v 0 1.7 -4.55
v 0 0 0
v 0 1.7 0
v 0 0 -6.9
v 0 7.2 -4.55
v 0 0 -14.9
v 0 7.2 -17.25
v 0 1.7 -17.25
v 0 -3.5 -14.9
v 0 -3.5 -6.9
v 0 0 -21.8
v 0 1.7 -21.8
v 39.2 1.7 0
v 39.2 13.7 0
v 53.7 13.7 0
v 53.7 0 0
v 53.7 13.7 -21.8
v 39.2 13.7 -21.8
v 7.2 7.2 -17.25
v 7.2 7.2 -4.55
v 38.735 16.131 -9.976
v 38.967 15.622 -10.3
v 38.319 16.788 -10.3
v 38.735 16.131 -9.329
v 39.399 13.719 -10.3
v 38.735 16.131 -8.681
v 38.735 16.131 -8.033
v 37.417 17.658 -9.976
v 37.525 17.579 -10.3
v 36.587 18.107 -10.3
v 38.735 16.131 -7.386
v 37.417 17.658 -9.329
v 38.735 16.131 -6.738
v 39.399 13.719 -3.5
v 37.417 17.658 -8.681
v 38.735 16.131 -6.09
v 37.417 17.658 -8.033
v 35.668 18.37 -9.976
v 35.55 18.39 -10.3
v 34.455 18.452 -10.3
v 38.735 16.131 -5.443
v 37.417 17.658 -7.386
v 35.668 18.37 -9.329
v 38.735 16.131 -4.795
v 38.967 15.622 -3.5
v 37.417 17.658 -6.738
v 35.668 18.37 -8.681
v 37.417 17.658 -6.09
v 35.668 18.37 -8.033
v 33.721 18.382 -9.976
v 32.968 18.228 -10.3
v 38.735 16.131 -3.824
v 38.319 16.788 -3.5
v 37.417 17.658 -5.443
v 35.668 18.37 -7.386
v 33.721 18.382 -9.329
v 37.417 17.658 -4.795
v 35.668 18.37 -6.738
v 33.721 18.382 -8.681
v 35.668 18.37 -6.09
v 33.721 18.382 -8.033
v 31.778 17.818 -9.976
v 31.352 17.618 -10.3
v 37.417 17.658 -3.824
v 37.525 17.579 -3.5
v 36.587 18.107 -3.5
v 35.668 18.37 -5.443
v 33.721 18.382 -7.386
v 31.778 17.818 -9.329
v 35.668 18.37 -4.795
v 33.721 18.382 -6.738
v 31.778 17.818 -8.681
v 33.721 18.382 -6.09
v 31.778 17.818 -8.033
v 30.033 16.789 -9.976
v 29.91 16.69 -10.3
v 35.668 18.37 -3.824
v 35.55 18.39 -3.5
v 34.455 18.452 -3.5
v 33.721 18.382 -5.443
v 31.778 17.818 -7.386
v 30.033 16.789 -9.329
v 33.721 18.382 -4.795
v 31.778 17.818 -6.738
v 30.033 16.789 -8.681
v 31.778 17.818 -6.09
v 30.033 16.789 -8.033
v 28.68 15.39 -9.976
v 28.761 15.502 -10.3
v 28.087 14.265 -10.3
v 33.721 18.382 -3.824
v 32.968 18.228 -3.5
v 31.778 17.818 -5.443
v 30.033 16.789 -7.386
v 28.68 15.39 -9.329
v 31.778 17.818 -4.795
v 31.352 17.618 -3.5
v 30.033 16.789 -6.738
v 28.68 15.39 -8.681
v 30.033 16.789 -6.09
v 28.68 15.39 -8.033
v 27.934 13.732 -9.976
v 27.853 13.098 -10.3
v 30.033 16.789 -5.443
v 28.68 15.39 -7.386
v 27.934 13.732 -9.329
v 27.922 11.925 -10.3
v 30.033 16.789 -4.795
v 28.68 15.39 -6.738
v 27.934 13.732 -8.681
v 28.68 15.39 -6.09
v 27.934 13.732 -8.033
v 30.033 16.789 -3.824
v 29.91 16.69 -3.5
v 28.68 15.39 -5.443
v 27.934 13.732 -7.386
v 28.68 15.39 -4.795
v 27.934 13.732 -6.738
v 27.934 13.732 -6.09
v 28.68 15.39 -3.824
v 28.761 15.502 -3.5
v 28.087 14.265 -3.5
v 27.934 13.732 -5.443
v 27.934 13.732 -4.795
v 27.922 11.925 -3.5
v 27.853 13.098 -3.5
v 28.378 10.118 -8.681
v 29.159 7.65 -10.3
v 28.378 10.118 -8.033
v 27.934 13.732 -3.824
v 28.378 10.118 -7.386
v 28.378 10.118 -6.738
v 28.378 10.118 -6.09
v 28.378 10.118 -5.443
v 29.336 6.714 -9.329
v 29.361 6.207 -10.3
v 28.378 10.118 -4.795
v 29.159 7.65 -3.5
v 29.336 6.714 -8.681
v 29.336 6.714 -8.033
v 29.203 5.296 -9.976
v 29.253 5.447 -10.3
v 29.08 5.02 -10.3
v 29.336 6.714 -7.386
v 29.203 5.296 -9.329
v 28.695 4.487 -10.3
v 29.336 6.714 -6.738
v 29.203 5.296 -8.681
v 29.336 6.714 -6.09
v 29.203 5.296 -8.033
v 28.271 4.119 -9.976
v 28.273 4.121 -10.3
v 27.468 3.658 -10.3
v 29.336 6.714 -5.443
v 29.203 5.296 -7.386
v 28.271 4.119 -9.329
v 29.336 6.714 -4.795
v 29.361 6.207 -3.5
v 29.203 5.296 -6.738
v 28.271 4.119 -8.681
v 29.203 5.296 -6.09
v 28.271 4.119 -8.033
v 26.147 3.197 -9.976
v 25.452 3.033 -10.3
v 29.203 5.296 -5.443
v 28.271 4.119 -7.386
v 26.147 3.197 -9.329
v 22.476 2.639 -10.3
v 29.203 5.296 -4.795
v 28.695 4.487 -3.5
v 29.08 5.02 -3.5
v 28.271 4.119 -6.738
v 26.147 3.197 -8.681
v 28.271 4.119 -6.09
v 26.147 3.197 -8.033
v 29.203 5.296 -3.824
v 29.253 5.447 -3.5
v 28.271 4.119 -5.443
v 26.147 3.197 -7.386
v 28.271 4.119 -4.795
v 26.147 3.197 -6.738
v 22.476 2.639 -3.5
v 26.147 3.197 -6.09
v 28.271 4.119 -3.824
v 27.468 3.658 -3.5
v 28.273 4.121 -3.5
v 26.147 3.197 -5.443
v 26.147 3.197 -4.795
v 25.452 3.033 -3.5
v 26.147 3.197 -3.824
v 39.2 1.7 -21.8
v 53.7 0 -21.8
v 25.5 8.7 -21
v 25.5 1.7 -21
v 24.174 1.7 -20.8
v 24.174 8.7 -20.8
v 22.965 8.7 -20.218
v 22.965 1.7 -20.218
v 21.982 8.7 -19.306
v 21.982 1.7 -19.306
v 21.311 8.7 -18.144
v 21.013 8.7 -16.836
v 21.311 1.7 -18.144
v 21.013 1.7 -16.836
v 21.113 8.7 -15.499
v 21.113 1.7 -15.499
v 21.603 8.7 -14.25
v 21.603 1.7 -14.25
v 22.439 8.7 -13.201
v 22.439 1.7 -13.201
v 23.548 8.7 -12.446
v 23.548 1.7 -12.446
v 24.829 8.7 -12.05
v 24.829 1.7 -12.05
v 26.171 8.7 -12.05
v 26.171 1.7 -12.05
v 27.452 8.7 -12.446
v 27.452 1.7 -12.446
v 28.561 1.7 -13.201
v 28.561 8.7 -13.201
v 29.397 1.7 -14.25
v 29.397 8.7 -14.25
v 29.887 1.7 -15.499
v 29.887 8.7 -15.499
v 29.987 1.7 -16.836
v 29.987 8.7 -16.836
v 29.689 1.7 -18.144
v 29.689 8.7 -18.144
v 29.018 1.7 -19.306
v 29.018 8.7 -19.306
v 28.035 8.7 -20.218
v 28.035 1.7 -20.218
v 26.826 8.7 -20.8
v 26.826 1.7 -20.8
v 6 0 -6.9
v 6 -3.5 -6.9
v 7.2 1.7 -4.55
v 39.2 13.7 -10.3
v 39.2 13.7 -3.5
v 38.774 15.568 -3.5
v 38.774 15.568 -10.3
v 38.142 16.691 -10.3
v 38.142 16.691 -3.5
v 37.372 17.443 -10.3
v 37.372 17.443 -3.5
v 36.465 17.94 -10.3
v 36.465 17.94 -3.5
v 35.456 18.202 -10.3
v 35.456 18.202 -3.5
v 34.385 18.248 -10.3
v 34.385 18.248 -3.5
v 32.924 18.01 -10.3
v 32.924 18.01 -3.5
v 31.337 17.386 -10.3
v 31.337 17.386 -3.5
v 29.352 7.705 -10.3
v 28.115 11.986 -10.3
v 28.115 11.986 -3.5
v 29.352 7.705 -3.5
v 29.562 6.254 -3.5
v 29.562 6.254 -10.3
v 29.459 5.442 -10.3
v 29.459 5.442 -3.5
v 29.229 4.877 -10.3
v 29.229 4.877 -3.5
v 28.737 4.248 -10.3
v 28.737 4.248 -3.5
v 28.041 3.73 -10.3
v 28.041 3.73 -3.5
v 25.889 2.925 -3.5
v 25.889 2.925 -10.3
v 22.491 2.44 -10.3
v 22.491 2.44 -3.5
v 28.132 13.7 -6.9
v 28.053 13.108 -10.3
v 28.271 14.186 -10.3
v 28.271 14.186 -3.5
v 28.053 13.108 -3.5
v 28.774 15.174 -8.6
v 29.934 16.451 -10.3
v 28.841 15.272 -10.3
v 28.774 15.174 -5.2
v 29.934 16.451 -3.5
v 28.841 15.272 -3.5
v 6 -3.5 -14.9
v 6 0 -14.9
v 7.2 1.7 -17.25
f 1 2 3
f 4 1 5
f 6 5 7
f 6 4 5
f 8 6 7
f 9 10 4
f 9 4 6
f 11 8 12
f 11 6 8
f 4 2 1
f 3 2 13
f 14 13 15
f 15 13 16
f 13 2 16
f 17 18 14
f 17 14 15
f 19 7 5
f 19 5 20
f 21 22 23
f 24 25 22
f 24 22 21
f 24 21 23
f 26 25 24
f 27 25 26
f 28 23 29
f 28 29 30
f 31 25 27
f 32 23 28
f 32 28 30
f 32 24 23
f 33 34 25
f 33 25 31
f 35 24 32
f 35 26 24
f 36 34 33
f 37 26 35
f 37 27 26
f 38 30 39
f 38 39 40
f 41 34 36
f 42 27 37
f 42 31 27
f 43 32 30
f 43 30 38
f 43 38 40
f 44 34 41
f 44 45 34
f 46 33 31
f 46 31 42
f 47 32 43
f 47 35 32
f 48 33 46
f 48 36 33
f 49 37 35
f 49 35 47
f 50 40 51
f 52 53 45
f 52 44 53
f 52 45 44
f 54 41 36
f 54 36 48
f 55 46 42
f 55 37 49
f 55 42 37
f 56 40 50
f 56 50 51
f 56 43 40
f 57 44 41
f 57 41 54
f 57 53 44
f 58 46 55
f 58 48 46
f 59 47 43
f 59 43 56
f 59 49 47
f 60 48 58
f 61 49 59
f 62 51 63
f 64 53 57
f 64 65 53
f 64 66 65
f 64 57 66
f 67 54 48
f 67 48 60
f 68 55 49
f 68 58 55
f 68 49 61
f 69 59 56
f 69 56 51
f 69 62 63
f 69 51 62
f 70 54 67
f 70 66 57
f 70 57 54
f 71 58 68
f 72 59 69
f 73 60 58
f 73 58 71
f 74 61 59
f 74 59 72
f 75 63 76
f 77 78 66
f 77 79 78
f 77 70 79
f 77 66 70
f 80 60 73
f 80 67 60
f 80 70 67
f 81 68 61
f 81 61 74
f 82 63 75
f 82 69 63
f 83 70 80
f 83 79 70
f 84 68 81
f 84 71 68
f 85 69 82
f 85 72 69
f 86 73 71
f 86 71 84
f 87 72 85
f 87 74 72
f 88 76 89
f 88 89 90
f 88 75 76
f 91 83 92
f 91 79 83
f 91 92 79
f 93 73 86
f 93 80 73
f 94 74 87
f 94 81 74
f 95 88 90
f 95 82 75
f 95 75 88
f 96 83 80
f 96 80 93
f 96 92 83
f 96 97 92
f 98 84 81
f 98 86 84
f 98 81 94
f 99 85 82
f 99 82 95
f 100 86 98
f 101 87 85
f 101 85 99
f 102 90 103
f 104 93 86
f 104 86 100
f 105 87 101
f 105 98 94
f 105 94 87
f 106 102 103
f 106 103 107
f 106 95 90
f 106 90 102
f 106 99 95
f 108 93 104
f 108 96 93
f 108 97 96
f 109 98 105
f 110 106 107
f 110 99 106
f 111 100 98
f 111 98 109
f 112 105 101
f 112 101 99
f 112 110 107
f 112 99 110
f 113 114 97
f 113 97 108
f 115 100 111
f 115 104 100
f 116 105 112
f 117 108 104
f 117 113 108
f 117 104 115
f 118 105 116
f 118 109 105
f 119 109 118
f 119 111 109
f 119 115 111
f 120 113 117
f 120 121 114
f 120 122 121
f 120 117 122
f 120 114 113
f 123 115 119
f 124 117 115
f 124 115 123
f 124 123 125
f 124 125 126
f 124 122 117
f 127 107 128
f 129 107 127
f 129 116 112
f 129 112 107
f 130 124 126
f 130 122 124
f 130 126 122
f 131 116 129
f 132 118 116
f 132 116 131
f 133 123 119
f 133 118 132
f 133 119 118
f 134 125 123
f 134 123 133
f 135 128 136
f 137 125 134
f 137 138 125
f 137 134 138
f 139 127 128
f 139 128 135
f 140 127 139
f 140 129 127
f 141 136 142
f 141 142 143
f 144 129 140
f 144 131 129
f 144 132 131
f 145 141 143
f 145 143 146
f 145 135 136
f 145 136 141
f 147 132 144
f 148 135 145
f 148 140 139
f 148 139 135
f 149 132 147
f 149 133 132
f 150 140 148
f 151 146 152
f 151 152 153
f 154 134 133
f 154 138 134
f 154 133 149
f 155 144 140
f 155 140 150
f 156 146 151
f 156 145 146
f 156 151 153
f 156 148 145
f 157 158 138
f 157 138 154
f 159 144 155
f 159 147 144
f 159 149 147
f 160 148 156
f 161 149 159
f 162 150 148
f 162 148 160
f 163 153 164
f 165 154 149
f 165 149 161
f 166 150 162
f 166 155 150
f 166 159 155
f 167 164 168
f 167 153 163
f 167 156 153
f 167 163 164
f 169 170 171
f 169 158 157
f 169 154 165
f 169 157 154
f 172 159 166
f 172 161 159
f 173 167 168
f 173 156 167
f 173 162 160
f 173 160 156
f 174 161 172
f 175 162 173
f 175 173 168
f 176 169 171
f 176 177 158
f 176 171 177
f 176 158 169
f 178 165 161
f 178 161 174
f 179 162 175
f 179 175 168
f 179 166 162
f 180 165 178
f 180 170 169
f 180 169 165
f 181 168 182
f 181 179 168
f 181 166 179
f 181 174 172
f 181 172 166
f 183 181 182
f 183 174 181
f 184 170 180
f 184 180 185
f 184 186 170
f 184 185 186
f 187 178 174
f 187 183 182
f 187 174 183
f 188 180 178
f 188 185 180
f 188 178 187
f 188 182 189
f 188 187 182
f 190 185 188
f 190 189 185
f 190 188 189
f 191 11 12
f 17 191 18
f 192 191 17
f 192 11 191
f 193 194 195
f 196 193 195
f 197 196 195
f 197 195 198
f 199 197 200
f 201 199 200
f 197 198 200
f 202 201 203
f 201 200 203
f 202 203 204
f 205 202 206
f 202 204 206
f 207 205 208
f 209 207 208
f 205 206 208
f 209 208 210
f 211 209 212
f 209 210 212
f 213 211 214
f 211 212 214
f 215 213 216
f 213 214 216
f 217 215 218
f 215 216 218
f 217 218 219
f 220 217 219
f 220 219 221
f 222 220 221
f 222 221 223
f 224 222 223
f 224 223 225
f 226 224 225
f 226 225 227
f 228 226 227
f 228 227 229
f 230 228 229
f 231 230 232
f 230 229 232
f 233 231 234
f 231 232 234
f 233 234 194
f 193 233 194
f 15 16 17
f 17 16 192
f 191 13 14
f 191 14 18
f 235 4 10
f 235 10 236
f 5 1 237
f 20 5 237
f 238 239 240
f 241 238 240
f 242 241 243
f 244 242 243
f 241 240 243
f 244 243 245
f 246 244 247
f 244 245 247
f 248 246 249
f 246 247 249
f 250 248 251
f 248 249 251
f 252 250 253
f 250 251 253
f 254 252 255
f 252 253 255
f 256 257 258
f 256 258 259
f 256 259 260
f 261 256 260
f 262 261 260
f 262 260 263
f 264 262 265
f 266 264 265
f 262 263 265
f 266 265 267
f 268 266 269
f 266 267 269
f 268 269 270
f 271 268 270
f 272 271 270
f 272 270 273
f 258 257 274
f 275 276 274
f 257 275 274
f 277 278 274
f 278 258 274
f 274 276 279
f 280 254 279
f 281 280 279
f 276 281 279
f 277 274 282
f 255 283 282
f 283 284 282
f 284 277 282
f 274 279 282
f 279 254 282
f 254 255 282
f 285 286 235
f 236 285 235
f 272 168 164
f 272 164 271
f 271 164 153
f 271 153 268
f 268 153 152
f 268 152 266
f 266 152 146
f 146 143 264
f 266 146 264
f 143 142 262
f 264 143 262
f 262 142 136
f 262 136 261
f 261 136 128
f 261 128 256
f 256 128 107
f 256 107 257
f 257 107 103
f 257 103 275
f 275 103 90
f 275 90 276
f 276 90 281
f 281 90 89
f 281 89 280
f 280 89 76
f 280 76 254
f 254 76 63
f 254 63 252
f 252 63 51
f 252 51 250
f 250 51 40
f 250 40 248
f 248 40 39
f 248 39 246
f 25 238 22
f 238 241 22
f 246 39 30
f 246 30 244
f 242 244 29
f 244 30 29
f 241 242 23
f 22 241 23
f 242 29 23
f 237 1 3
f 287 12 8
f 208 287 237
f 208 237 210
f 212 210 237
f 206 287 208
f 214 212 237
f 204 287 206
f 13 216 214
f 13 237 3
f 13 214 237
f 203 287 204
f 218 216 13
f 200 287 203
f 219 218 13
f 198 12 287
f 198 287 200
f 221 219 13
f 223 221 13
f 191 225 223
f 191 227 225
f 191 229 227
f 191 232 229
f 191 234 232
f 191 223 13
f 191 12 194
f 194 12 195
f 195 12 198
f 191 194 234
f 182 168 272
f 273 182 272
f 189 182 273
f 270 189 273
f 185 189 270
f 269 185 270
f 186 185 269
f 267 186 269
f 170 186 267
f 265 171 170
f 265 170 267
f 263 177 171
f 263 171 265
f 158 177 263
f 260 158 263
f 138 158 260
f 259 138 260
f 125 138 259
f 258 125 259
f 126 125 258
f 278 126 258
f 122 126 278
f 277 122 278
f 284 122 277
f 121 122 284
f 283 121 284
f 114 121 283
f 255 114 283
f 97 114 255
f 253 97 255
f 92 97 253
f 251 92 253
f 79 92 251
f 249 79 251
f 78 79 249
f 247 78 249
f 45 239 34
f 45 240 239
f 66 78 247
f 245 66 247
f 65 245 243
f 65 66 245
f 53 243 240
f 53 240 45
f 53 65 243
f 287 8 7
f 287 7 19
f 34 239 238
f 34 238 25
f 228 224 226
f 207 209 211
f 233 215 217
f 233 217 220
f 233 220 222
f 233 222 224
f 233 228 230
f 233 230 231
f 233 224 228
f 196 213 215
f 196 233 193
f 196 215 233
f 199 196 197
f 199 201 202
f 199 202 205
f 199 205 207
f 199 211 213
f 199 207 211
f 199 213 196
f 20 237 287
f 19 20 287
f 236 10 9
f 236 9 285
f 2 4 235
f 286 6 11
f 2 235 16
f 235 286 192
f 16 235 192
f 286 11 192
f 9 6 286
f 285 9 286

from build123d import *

# Parameters (mm, degrees)
SKETCH1_W           = 53.7
SKETCH1_H           = 21.8
BOSS_EXTRUDE1_DEPTH = 1.7
SKETCH2_W           = 14.5
SKETCH2_H           = 21.8
BOSS_EXTRUDE2_DEPTH = 12
BOSS_EXTRUDE3_DEPTH = 6.8
SKETCH4_R           = 4.5
BOSS_EXTRUDE4_DEPTH = 7
SKETCH5_W           = 7.2
SKETCH5_H           = 12.7
BOSS_EXTRUDE5_DEPTH = 5.5
SKETCH6_W           = 6
SKETCH6_H           = 8
BOSS_EXTRUDE6_DEPTH = 3.5


with BuildPart() as part:
    # Sketch1 → Boss-Extrude1 (new body)
    with BuildSketch(Plane(origin=(0, 0, 0), x_dir=(1, 0, 0), z_dir=(0, 1, 0))):
        with Locations((26.85, 10.9)):
            Rectangle(SKETCH1_W, SKETCH1_H)
    extrude(amount=BOSS_EXTRUDE1_DEPTH)

    # Sketch2 → Boss-Extrude2 (add)
    with BuildSketch(Plane(origin=(0, 1.7, 0), x_dir=(1, 0, 0), z_dir=(0, 1, 0))):
        with Locations((46.45, 10.9)):
            Rectangle(SKETCH2_W, SKETCH2_H)
    extrude(amount=BOSS_EXTRUDE2_DEPTH)

    # Sketch4 → Boss-Extrude4 (add)
    with BuildSketch(Plane(origin=(0, 1.7, 0), x_dir=(1, 0, 0), z_dir=(0, 1, 0))):
        with Locations(Location((25.5, 16.5, 0), (0, 0, 90))):
            Circle(SKETCH4_R)
    extrude(amount=BOSS_EXTRUDE4_DEPTH)

    # Sketch5 → Boss-Extrude5 (add)
    with BuildSketch(Plane(origin=(0, 1.7, 0), x_dir=(1, 0, 0), z_dir=(0, 1, 0))):
        with Locations((3.6, 10.9)):
            Rectangle(SKETCH5_W, SKETCH5_H)
    extrude(amount=BOSS_EXTRUDE5_DEPTH)

    # Sketch6 → Boss-Extrude6 (add)
    with BuildSketch(Plane.XZ):
        with Locations((3, -10.9)):
            Rectangle(SKETCH6_W, SKETCH6_H)
    extrude(amount=BOSS_EXTRUDE6_DEPTH)


with BuildPart() as body_2:
    # Sketch3 → Boss-Extrude3 (new body)
    with BuildSketch(Plane.XY.offset(-3.5)):
        with BuildLine():
            Line((39.2, 13.7), (39.399104786, 13.718901958))
            add(Edge.make_bspline(
                [(39.399104786, 13.718901958), (39.37716637, 13.949991445), (39.312900137, 14.422722145), (39.121163674, 15.257604809), (38.762934197, 16.168832029), (38.168169426, 17.036855896), (37.189876498, 17.910500102), (35.699484662, 18.487221271), (33.719854527, 18.478167154), (31.745006015, 17.894754952), (29.377277148, 16.502877604), (27.780674525, 14.364129981), (27.842717967, 11.932579741), (28.357836119, 10.111287242), (28.994339416, 8.332214987), (29.422219371, 6.674833479), (29.330934537, 5.254184283), (28.614392477, 4.277524246), (27.439642851, 3.606350644), (26.21323705, 3.181637282), (24.860216287, 2.90360878), (23.583056392, 2.734797552), (22.83643137, 2.666133946), (22.475855855, 2.639010515)],
                knots=[0, 0, 0, 0, 0.015625, 0.03125, 0.0625, 0.09375, 0.125, 0.1875, 0.25, 0.3125, 0.375, 0.5, 0.5625, 0.625, 0.6875, 0.75, 0.8125, 0.875, 0.90625, 0.9375, 0.96875, 0.984375, 1, 1, 1, 1], degree=3))
            Line((22.475855855, 2.639010515), (22.490857993, 2.439573969))
            add(Edge.make_bspline(
                [(39.2, 13.7), (38.487619517, 21.203898001), (19.665936796, 15.106413478), (34.703585042, 3.358247179), (22.490857993, 2.439573969)],
                knots=[0, 0, 0, 0, 0.499649345, 1, 1, 1, 1], degree=3))
        make_face()
    extrude(amount=-BOSS_EXTRUDE3_DEPTH)


solid = Compound([part.part, body_2.part])
